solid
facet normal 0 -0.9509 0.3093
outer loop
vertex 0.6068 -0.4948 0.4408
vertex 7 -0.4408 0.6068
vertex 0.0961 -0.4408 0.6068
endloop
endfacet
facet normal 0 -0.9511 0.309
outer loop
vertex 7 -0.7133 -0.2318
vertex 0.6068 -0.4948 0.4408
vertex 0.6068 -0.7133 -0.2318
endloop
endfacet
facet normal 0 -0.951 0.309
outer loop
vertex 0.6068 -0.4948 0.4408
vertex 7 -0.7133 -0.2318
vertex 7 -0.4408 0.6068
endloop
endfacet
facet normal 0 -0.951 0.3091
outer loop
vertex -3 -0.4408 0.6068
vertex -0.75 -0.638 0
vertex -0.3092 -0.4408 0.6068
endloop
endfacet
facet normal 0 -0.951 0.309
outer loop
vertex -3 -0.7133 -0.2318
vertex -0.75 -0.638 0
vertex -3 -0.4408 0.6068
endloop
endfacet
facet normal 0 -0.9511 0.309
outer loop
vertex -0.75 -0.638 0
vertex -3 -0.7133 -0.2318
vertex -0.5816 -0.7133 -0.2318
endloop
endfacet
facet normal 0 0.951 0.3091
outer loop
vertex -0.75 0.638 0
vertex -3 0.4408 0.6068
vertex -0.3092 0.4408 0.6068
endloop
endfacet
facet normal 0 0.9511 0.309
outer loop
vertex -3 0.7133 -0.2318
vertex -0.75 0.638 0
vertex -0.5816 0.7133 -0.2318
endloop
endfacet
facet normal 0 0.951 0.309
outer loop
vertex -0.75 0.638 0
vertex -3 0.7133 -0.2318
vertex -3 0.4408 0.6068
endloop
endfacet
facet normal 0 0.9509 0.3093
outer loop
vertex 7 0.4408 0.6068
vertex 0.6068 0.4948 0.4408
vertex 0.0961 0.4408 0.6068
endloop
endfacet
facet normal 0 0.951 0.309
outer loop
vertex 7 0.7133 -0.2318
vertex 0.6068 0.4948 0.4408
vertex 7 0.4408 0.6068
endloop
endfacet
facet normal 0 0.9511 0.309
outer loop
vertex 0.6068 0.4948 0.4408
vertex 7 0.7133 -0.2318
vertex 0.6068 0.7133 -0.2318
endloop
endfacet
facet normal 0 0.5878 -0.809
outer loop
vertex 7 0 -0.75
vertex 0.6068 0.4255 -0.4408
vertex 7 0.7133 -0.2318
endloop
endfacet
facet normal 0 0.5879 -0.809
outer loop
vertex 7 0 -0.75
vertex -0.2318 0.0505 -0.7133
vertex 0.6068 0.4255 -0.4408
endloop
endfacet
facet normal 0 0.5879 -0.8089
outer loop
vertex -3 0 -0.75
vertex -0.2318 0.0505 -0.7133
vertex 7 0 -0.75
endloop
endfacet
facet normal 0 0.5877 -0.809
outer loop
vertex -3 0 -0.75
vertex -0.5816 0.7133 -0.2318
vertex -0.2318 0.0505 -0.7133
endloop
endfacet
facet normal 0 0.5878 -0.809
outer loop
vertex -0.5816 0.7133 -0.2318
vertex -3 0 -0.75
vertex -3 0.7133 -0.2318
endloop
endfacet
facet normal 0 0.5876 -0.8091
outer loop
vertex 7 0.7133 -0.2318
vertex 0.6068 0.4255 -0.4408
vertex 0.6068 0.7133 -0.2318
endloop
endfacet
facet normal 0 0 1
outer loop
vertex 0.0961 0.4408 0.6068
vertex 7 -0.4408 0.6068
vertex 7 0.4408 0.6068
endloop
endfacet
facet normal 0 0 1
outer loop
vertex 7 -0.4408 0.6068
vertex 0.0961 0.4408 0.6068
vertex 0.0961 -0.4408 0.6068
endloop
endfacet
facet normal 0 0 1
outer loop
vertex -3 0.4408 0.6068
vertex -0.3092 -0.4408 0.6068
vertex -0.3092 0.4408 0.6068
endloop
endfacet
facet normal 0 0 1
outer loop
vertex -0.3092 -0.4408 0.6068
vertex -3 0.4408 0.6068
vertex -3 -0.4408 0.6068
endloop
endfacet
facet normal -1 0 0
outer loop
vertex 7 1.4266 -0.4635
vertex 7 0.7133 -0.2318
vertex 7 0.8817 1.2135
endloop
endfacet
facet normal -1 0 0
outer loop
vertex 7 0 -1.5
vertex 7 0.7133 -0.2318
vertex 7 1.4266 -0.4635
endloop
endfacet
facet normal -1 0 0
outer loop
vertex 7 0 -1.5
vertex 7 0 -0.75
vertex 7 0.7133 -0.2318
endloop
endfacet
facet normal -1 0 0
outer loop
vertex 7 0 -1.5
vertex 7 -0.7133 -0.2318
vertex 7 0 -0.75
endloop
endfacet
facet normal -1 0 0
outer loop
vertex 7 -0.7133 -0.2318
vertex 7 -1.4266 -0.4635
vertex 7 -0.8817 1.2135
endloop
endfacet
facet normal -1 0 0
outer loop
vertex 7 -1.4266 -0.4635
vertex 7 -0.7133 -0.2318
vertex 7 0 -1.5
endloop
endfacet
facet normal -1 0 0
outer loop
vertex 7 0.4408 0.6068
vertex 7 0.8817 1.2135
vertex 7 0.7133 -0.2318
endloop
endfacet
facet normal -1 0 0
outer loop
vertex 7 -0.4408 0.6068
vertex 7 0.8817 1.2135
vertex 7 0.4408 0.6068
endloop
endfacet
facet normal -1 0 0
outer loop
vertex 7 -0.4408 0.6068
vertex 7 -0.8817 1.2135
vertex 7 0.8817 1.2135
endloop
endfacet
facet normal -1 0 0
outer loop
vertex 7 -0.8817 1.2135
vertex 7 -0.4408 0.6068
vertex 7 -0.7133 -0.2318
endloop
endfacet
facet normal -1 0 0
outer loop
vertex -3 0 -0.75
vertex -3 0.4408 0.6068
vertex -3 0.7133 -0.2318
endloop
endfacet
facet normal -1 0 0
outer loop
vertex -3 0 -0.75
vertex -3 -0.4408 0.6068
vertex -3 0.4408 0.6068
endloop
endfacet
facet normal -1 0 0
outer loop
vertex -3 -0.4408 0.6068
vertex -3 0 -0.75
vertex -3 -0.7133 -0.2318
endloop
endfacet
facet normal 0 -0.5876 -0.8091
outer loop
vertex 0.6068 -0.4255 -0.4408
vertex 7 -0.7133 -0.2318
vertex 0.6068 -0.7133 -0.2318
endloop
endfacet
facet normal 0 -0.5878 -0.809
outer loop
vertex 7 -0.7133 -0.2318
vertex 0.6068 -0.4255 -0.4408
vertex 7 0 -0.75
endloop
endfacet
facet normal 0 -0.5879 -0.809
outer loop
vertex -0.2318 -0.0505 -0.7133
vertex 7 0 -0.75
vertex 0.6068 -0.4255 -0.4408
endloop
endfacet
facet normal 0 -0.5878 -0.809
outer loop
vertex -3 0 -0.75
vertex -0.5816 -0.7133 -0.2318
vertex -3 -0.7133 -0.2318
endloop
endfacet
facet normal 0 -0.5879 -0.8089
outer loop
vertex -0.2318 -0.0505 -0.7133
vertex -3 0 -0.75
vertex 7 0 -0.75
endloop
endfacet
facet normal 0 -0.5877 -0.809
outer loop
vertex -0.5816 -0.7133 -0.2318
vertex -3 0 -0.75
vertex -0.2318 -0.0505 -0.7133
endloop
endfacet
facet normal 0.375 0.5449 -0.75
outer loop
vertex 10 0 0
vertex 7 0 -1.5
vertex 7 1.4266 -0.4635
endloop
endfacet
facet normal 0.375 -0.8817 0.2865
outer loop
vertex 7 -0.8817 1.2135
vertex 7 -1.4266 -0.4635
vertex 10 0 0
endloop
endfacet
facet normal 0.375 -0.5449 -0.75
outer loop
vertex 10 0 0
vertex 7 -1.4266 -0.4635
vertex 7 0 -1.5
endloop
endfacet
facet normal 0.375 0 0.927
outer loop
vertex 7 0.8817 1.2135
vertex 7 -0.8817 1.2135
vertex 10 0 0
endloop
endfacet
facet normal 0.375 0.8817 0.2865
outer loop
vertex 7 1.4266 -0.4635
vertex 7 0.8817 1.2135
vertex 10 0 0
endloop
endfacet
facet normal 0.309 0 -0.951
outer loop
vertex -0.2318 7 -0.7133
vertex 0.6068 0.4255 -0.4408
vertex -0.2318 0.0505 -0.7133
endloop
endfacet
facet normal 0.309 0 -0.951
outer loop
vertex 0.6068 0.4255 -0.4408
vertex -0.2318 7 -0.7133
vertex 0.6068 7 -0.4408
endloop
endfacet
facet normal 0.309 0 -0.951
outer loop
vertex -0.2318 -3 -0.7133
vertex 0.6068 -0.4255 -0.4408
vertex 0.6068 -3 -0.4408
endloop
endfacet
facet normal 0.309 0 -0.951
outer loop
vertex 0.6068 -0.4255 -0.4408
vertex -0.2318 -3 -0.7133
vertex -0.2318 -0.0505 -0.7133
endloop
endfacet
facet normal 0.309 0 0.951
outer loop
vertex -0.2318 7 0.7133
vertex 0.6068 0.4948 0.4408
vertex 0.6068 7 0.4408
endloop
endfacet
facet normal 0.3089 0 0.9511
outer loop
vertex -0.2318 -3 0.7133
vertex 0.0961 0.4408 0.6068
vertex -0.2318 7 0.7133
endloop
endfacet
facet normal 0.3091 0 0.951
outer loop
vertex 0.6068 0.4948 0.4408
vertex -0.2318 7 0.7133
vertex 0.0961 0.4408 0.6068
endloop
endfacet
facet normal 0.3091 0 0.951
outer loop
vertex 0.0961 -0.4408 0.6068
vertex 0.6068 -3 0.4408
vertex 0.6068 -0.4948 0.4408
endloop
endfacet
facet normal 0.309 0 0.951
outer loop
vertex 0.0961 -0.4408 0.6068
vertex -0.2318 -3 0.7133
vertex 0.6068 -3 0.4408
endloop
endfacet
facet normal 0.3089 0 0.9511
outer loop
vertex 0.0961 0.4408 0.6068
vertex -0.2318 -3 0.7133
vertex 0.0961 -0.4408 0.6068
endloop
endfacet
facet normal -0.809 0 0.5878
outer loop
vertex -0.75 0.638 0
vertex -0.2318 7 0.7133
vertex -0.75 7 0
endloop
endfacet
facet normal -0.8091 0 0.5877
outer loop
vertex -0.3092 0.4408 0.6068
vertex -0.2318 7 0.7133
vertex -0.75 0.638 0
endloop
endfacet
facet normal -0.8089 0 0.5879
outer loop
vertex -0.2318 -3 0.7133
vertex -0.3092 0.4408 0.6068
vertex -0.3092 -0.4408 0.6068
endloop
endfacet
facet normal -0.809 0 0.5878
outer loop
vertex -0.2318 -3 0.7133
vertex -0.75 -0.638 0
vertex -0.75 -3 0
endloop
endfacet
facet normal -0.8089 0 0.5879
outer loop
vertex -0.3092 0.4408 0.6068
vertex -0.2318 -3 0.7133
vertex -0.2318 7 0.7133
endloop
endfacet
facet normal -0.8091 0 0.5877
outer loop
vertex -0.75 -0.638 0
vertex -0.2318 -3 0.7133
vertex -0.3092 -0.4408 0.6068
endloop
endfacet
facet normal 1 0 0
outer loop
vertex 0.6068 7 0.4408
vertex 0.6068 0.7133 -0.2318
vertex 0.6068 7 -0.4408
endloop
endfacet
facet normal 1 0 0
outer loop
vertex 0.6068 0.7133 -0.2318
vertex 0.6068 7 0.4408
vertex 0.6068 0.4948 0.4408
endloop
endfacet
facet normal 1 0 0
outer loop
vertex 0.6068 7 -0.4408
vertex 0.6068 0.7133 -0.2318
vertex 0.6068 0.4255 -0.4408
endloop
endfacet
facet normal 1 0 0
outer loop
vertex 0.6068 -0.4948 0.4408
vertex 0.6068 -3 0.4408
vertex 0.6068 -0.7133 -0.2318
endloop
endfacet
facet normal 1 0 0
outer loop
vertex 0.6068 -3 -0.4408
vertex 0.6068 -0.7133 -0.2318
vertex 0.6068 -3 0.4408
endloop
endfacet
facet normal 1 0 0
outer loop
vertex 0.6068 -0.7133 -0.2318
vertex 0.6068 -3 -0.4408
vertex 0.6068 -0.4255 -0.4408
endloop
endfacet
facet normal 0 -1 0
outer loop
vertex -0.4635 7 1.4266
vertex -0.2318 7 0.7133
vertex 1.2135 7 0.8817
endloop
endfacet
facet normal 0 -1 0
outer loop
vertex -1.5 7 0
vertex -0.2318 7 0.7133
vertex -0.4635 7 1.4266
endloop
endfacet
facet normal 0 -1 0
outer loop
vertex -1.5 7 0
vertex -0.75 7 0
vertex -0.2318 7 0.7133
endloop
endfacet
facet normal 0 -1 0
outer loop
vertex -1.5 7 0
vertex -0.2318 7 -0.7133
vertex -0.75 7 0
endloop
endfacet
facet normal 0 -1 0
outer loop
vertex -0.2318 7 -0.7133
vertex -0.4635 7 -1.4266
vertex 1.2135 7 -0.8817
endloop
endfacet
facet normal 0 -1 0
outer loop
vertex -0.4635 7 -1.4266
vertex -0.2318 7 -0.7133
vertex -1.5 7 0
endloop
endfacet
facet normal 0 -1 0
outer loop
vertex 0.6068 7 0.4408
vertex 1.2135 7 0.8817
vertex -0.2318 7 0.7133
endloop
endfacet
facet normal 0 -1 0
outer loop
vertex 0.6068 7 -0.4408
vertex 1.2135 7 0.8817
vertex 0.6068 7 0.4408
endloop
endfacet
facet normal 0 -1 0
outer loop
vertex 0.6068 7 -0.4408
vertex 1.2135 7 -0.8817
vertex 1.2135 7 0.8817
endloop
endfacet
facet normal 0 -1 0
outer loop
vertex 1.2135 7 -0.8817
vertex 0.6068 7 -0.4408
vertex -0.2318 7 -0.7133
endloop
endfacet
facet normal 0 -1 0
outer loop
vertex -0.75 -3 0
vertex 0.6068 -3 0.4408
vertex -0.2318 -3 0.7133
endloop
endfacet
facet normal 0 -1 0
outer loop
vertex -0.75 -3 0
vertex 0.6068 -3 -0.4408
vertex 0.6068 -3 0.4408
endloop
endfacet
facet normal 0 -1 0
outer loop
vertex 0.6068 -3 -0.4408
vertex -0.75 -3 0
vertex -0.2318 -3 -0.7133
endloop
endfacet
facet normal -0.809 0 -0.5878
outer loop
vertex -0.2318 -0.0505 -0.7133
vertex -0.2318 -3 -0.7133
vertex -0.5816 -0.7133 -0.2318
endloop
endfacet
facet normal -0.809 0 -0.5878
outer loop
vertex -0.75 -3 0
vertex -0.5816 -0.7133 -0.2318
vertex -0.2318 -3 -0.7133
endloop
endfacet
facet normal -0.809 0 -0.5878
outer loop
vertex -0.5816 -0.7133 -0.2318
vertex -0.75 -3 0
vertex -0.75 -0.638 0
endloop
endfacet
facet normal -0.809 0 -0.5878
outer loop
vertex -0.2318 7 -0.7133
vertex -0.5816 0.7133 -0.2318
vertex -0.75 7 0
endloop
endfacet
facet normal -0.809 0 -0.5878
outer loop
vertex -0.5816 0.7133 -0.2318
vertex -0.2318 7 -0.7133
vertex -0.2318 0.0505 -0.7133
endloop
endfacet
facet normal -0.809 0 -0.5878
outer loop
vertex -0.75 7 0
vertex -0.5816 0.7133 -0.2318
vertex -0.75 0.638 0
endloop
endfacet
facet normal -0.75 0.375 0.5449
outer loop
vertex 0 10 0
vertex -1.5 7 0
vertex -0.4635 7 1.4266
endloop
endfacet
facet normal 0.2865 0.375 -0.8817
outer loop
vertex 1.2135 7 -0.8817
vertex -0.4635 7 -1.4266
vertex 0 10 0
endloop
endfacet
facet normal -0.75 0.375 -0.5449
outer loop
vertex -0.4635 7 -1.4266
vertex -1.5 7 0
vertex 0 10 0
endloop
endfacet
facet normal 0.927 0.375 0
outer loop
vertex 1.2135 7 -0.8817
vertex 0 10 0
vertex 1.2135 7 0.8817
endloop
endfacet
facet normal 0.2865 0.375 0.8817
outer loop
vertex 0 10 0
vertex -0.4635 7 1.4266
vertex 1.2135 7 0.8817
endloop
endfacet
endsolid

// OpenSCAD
// Start: lazy_union
default_5_default_5();
// End: lazy_union

// Modules.

// 'PartMaterial undef-default - default 5.0'
module default_5_default_5() {
  // 'None : _combine_solids_and_holes'
  union() {
    // 'default : _combine_solids_and_holes'
    union() {
      // 'x_arrow'
      multmatrix(m=[[0.0, 0.0, -1.0, -3.0], [0.0, -1.0, 0.0, 0.0], [-1.0, 0.0, 0.0, 0.0], [0.0, 0.0, 0.0, 1.0]]) {
        // 'x_arrow'
        color(c=[1.0, 0.0, 0.0, 1.0]) {
          // 'x_arrow : _combine_solids_and_holes'
          union() {
            // 'stem'
            multmatrix(m=[[1.0, 0.0, 0.0, 0.0], [-0.0, -1.0, -0.0, -0.0], [-0.0, -0.0, -1.0, -0.0], [0.0, 0.0, 0.0, 1.0]]) {
              // 'stem : _combine_solids_and_holes'
              union() {
                // 'stem'
                cylinder(h=10.0, r1=0.75, r2=0.75, center=false);
              }
            }
            // 'head'
            multmatrix(m=[[1.0, 0.0, 0.0, 0.0], [0.0, -1.0, 0.0, 0.0], [0.0, 0.0, -1.0, -10.0], [0.0, 0.0, 0.0, 1.0]]) {
              // 'head : _combine_solids_and_holes'
              union() {
                // 'head'
                cylinder(h=3.0, r1=1.5, r2=0.0, center=false);
              }
            }
          }
        }
      }
      // 'y_arrow'
      multmatrix(m=[[-1.0, 0.0, 0.0, 0.0], [0.0, 0.0, -1.0, -3.0], [0.0, -1.0, 0.0, 0.0], [0.0, 0.0, 0.0, 1.0]]) {
        // 'y_arrow'
        color(c=[0.0, 0.5019607843137255, 0.0, 1.0]) {
          // 'y_arrow : _combine_solids_and_holes'
          union() {
            // 'stem'
            multmatrix(m=[[1.0, 0.0, 0.0, 0.0], [-0.0, -1.0, -0.0, -0.0], [-0.0, -0.0, -1.0, -0.0], [0.0, 0.0, 0.0, 1.0]]) {
              // 'stem : _combine_solids_and_holes'
              union() {
                // 'stem'
                cylinder(h=10.0, r1=0.75, r2=0.75, center=false);
              }
            }
            // 'head'
            multmatrix(m=[[1.0, 0.0, 0.0, 0.0], [0.0, -1.0, 0.0, 0.0], [0.0, 0.0, -1.0, -10.0], [0.0, 0.0, 0.0, 1.0]]) {
              // 'head : _combine_solids_and_holes'
              union() {
                // 'head'
                cylinder(h=3.0, r1=1.5, r2=0.0, center=false);
              }
            }
          }
        }
      }
    }
  }
} // end module default_5_default_5
